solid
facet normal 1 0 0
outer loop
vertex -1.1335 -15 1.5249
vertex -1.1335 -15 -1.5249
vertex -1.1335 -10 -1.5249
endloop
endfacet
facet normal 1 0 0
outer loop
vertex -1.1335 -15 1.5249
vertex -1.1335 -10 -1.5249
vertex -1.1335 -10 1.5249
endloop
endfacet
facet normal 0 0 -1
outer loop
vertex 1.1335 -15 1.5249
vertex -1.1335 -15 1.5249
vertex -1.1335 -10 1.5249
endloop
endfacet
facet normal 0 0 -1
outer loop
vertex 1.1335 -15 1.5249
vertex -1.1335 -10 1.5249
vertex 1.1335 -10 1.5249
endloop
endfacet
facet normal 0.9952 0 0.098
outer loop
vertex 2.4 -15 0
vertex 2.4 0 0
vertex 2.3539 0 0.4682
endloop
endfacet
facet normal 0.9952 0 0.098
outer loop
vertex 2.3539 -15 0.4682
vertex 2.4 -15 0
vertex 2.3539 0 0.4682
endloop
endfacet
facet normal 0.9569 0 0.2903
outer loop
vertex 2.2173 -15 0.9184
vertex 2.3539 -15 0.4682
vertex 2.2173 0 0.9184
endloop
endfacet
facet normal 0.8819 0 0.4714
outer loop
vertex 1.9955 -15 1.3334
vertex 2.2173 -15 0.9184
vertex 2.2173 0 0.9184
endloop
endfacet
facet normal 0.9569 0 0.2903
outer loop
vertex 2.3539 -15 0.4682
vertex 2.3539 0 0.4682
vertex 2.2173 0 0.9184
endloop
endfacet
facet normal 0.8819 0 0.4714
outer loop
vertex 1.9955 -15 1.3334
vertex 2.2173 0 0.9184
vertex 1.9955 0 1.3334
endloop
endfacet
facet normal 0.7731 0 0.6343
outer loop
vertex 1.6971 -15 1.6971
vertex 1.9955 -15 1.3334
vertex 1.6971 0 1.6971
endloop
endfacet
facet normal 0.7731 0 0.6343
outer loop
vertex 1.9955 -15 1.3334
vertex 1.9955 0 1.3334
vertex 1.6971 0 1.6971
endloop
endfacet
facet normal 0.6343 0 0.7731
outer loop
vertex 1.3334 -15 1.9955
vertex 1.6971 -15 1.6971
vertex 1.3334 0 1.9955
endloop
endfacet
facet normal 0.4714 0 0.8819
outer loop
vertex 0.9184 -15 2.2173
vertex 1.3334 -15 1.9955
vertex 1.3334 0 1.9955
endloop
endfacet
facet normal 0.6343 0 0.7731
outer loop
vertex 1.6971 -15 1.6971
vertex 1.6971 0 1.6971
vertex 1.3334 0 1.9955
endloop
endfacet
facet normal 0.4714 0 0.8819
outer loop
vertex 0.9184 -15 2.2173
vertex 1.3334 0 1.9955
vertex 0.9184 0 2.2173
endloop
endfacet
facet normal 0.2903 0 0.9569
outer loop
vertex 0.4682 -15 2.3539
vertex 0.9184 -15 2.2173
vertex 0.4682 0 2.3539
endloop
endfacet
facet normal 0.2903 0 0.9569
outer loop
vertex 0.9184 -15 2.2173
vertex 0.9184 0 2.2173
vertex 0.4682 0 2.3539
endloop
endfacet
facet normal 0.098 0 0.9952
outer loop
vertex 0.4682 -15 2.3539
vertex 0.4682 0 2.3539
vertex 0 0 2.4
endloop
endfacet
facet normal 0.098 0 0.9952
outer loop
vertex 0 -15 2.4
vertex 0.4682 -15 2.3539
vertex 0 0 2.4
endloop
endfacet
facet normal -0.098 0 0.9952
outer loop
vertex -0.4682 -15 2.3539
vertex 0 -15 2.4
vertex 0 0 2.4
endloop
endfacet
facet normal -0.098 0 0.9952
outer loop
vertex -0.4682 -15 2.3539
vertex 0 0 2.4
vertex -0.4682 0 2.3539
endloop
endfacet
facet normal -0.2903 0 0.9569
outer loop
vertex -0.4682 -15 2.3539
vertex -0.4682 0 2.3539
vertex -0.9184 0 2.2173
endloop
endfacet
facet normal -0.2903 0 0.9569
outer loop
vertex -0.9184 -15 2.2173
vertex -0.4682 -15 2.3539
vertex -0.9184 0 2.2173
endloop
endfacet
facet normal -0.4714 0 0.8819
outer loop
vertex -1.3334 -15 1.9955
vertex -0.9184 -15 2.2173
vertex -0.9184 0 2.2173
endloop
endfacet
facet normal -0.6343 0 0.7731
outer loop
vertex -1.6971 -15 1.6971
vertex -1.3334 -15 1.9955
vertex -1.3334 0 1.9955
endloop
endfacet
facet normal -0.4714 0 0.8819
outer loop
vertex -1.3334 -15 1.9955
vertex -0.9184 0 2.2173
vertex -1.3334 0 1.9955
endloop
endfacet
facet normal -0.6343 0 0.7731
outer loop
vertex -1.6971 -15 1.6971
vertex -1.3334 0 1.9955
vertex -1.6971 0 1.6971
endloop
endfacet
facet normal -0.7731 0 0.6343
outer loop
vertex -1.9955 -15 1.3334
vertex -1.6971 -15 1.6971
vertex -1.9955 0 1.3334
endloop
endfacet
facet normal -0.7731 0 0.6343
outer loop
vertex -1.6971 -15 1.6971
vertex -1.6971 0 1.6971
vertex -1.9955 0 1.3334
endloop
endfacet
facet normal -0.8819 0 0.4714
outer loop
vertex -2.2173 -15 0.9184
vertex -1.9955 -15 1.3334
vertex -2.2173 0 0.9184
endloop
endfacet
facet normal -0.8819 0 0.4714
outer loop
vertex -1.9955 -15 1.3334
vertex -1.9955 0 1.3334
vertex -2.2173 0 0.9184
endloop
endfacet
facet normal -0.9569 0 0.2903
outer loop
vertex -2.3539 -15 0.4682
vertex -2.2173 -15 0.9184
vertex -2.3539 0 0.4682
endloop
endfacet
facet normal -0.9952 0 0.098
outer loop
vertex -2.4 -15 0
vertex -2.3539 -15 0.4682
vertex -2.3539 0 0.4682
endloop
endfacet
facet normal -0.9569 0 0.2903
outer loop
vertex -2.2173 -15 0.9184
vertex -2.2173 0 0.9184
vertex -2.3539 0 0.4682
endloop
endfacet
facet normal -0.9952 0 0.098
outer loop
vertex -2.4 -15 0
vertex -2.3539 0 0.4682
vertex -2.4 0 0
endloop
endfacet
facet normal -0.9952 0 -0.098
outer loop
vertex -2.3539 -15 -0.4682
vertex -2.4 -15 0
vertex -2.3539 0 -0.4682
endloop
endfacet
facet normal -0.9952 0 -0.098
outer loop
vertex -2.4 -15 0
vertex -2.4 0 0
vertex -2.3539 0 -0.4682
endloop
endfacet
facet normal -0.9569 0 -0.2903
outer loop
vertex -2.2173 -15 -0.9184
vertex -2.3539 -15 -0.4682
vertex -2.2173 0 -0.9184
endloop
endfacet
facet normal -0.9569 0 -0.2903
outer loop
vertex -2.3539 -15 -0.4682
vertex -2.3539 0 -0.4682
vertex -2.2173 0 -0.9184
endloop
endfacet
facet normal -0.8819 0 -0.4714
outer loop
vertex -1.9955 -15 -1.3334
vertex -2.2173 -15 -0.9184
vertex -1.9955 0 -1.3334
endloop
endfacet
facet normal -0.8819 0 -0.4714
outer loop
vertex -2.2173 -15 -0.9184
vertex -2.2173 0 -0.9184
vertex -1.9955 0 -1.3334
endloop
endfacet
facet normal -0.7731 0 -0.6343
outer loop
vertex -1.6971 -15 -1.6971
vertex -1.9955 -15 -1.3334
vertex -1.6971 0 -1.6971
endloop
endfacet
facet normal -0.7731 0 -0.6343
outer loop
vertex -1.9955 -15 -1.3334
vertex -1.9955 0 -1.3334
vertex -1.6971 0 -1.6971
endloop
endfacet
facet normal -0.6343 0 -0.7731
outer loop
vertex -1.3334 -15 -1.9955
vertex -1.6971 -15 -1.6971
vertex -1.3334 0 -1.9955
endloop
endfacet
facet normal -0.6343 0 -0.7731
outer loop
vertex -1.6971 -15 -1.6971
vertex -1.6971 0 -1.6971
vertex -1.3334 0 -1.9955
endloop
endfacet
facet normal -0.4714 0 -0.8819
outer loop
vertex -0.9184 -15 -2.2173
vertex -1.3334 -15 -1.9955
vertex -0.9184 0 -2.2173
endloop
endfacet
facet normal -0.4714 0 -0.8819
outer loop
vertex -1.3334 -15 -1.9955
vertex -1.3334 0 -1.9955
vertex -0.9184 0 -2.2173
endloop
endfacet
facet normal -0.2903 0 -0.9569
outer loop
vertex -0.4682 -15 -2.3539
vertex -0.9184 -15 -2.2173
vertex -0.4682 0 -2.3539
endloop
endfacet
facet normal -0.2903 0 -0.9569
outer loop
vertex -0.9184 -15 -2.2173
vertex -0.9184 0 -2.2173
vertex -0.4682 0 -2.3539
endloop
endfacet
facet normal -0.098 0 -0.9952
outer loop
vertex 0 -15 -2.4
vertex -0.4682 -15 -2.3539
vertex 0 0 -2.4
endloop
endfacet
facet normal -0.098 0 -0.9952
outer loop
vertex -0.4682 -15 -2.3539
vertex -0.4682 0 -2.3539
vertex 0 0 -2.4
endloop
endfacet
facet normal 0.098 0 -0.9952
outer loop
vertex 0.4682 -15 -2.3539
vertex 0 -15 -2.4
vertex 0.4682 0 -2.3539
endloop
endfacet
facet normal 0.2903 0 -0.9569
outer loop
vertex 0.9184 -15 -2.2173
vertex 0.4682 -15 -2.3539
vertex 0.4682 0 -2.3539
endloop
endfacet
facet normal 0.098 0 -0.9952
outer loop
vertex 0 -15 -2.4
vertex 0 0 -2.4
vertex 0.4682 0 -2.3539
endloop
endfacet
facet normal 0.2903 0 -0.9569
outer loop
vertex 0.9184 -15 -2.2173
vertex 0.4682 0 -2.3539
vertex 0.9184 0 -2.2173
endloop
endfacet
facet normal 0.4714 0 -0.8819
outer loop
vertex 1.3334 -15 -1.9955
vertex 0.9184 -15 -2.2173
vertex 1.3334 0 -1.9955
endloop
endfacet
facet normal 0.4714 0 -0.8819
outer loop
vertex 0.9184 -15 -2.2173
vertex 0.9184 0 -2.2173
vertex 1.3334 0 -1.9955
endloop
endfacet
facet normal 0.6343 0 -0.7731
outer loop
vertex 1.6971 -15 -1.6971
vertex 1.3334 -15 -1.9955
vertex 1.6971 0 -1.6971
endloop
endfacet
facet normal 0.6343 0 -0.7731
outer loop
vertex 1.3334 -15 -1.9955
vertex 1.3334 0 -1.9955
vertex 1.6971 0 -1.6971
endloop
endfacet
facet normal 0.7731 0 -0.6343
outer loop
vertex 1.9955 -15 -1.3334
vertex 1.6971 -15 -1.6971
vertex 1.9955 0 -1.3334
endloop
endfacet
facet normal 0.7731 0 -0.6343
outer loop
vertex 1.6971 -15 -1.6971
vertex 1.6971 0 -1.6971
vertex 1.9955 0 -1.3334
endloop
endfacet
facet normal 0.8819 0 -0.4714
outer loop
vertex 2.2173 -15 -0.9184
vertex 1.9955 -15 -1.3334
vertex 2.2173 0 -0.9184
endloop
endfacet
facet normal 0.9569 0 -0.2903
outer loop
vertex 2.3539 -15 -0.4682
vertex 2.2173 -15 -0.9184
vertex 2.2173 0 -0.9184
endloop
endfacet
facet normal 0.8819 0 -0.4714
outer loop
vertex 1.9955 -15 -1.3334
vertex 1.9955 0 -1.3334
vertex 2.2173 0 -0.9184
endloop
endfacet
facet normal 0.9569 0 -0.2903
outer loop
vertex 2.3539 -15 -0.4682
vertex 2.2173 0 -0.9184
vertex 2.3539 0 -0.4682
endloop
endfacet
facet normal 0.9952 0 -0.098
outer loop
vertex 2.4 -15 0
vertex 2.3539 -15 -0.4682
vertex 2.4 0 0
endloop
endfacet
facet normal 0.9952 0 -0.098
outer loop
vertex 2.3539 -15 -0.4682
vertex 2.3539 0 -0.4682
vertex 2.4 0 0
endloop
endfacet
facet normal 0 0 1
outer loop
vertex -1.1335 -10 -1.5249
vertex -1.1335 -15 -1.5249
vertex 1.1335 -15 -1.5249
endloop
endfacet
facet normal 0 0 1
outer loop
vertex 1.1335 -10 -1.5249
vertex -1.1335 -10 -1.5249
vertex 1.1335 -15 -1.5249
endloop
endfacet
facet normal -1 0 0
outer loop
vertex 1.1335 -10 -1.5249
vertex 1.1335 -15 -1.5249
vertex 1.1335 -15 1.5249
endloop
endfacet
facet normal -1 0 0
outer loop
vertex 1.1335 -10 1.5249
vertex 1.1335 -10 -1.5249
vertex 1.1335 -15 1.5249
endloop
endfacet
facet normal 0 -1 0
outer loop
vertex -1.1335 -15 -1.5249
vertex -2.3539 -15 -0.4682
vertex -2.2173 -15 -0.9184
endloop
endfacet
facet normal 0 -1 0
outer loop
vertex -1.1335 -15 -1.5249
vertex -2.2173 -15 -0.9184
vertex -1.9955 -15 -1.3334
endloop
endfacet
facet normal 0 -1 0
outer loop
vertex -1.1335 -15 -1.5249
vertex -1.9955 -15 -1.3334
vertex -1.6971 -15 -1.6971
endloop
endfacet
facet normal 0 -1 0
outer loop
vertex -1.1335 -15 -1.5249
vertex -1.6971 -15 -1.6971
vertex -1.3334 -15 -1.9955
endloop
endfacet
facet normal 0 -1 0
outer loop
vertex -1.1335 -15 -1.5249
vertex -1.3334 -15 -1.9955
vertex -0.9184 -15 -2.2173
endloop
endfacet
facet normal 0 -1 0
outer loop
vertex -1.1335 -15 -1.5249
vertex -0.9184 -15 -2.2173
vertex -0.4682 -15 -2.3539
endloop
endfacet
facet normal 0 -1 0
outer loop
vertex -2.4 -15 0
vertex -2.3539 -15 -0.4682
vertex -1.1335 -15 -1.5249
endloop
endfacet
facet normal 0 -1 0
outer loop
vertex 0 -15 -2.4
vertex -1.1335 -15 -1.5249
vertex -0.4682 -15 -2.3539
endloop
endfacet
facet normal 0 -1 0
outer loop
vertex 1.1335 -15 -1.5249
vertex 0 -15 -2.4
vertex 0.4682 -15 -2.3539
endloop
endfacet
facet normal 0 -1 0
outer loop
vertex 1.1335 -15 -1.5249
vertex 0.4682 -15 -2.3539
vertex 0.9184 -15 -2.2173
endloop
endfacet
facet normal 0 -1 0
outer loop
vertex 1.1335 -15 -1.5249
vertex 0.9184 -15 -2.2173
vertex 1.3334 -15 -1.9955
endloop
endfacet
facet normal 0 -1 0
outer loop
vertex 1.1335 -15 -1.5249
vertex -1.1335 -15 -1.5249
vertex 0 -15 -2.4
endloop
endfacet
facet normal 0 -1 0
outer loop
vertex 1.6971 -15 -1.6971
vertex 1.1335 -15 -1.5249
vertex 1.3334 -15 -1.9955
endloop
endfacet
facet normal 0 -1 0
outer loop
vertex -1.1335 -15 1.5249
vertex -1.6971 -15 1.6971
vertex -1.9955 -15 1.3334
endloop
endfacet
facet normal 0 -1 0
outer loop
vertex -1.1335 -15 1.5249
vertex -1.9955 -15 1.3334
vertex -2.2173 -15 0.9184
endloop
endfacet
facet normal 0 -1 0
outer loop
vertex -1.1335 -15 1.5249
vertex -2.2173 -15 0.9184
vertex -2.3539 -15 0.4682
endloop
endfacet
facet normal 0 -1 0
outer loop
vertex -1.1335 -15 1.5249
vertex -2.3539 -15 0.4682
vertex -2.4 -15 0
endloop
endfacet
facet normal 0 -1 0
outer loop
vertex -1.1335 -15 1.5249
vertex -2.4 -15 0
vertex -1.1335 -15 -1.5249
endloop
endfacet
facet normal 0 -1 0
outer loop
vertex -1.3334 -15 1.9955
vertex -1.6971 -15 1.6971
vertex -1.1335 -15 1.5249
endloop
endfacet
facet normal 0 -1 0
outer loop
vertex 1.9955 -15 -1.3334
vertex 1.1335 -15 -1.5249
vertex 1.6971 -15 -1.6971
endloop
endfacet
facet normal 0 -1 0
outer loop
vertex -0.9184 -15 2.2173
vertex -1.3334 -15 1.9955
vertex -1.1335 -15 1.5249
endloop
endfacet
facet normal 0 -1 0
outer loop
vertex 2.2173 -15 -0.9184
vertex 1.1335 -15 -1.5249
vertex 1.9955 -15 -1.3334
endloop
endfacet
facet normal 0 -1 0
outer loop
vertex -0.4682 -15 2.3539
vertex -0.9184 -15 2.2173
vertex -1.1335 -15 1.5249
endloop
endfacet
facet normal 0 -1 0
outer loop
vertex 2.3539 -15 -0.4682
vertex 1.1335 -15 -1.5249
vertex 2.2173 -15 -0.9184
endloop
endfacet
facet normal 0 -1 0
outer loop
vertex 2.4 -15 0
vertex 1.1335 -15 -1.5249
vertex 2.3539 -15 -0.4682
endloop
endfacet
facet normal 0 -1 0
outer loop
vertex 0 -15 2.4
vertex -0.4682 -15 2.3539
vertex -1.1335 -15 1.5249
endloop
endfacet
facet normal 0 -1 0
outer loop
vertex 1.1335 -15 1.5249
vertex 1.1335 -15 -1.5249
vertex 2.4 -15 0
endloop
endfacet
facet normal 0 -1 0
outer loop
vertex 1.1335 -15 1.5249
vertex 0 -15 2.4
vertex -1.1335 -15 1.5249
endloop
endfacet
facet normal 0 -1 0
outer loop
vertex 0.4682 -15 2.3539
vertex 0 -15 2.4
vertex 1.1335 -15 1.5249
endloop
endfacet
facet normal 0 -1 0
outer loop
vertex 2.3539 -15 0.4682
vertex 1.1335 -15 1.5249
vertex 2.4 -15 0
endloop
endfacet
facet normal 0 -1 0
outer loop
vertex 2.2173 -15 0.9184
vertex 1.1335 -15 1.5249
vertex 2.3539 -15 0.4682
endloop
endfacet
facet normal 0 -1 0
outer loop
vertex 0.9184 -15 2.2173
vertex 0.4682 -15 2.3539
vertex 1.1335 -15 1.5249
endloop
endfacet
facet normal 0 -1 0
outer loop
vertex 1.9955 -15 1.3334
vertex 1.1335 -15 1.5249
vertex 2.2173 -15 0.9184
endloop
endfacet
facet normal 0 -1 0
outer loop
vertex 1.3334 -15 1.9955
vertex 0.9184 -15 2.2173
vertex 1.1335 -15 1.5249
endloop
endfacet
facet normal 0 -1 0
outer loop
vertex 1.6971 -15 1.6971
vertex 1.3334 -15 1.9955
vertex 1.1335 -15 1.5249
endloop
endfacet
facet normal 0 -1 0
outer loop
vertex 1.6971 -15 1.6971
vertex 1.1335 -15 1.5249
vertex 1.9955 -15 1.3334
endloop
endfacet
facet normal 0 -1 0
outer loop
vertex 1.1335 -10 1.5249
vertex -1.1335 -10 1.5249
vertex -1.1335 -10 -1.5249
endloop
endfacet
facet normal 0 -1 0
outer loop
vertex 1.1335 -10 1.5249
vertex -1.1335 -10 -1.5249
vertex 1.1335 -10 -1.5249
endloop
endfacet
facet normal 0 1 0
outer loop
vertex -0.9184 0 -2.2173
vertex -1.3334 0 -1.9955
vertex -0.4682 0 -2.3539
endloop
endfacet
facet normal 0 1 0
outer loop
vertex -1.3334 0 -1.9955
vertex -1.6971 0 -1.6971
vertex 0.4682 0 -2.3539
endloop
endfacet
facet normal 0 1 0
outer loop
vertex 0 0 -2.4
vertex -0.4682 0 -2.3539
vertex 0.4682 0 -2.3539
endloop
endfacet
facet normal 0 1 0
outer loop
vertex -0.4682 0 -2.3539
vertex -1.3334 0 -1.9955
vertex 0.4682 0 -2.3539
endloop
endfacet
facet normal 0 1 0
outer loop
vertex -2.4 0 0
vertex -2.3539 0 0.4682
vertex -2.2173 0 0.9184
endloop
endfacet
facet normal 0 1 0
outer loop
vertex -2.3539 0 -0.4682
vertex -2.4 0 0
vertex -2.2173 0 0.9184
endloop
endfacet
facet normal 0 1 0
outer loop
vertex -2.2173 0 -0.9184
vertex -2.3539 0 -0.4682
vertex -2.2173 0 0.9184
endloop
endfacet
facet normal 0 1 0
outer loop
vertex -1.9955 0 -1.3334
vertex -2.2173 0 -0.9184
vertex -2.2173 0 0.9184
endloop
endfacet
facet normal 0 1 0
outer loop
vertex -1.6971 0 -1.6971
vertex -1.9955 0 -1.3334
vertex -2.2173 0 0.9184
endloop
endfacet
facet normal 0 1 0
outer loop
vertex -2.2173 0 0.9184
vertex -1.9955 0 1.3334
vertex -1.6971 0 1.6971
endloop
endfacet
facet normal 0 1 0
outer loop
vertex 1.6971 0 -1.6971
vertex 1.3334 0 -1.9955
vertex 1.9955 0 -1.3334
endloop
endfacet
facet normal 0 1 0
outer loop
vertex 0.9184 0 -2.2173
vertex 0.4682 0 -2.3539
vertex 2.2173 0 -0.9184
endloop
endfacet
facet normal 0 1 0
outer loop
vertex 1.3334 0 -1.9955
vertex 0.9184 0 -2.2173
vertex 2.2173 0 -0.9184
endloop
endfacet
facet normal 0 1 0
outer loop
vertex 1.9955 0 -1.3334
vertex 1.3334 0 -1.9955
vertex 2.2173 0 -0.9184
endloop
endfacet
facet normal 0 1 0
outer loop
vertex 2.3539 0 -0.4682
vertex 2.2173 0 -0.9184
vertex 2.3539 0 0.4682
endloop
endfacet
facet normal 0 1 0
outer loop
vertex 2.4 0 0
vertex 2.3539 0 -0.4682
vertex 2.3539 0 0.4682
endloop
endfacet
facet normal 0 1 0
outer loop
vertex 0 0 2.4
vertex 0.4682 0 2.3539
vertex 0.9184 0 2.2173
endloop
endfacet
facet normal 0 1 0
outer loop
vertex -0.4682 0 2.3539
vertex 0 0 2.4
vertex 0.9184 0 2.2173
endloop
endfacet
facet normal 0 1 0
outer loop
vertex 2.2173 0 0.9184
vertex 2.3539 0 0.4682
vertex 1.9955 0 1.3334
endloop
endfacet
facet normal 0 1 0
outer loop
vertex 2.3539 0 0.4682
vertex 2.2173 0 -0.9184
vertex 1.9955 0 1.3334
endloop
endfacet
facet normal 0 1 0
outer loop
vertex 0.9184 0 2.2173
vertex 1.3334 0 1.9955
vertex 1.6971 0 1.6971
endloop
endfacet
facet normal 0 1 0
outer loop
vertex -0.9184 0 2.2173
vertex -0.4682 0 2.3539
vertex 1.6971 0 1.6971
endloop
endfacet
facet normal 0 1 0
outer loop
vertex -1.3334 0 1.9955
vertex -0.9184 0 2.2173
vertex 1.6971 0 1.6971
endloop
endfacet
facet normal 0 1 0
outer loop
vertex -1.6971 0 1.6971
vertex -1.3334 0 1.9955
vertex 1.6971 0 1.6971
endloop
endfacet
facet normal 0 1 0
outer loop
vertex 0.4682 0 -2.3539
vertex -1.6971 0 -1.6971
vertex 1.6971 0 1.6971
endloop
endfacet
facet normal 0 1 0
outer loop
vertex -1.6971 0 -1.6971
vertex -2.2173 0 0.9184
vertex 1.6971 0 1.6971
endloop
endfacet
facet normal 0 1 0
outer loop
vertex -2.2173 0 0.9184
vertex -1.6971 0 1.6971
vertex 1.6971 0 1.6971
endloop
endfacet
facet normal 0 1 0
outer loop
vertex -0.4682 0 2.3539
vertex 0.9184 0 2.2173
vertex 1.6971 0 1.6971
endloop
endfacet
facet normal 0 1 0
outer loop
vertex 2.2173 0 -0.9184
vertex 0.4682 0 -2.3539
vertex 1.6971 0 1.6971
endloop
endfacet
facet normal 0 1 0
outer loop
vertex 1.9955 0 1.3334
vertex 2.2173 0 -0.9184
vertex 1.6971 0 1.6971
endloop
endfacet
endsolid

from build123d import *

# Parameters (mm, degrees)
F0_R     = 2.4
F1_DEPTH = 15
F2_W     = 2.267002
F2_H     = 3.049704
F3_DEPTH = 5


with BuildPart() as f1:
    # F0 (on Front) → F1 (new body)
    with BuildSketch(Plane.XZ):
        Circle(F0_R)
    extrude(amount=F1_DEPTH)

    # F2 (on face) → F3 (cut)
    with BuildSketch(Plane.XZ.offset(15)):
        Rectangle(F2_W, F2_H)
    extrude(amount=-F3_DEPTH, mode=Mode.SUBTRACT)


solid = f1.part
